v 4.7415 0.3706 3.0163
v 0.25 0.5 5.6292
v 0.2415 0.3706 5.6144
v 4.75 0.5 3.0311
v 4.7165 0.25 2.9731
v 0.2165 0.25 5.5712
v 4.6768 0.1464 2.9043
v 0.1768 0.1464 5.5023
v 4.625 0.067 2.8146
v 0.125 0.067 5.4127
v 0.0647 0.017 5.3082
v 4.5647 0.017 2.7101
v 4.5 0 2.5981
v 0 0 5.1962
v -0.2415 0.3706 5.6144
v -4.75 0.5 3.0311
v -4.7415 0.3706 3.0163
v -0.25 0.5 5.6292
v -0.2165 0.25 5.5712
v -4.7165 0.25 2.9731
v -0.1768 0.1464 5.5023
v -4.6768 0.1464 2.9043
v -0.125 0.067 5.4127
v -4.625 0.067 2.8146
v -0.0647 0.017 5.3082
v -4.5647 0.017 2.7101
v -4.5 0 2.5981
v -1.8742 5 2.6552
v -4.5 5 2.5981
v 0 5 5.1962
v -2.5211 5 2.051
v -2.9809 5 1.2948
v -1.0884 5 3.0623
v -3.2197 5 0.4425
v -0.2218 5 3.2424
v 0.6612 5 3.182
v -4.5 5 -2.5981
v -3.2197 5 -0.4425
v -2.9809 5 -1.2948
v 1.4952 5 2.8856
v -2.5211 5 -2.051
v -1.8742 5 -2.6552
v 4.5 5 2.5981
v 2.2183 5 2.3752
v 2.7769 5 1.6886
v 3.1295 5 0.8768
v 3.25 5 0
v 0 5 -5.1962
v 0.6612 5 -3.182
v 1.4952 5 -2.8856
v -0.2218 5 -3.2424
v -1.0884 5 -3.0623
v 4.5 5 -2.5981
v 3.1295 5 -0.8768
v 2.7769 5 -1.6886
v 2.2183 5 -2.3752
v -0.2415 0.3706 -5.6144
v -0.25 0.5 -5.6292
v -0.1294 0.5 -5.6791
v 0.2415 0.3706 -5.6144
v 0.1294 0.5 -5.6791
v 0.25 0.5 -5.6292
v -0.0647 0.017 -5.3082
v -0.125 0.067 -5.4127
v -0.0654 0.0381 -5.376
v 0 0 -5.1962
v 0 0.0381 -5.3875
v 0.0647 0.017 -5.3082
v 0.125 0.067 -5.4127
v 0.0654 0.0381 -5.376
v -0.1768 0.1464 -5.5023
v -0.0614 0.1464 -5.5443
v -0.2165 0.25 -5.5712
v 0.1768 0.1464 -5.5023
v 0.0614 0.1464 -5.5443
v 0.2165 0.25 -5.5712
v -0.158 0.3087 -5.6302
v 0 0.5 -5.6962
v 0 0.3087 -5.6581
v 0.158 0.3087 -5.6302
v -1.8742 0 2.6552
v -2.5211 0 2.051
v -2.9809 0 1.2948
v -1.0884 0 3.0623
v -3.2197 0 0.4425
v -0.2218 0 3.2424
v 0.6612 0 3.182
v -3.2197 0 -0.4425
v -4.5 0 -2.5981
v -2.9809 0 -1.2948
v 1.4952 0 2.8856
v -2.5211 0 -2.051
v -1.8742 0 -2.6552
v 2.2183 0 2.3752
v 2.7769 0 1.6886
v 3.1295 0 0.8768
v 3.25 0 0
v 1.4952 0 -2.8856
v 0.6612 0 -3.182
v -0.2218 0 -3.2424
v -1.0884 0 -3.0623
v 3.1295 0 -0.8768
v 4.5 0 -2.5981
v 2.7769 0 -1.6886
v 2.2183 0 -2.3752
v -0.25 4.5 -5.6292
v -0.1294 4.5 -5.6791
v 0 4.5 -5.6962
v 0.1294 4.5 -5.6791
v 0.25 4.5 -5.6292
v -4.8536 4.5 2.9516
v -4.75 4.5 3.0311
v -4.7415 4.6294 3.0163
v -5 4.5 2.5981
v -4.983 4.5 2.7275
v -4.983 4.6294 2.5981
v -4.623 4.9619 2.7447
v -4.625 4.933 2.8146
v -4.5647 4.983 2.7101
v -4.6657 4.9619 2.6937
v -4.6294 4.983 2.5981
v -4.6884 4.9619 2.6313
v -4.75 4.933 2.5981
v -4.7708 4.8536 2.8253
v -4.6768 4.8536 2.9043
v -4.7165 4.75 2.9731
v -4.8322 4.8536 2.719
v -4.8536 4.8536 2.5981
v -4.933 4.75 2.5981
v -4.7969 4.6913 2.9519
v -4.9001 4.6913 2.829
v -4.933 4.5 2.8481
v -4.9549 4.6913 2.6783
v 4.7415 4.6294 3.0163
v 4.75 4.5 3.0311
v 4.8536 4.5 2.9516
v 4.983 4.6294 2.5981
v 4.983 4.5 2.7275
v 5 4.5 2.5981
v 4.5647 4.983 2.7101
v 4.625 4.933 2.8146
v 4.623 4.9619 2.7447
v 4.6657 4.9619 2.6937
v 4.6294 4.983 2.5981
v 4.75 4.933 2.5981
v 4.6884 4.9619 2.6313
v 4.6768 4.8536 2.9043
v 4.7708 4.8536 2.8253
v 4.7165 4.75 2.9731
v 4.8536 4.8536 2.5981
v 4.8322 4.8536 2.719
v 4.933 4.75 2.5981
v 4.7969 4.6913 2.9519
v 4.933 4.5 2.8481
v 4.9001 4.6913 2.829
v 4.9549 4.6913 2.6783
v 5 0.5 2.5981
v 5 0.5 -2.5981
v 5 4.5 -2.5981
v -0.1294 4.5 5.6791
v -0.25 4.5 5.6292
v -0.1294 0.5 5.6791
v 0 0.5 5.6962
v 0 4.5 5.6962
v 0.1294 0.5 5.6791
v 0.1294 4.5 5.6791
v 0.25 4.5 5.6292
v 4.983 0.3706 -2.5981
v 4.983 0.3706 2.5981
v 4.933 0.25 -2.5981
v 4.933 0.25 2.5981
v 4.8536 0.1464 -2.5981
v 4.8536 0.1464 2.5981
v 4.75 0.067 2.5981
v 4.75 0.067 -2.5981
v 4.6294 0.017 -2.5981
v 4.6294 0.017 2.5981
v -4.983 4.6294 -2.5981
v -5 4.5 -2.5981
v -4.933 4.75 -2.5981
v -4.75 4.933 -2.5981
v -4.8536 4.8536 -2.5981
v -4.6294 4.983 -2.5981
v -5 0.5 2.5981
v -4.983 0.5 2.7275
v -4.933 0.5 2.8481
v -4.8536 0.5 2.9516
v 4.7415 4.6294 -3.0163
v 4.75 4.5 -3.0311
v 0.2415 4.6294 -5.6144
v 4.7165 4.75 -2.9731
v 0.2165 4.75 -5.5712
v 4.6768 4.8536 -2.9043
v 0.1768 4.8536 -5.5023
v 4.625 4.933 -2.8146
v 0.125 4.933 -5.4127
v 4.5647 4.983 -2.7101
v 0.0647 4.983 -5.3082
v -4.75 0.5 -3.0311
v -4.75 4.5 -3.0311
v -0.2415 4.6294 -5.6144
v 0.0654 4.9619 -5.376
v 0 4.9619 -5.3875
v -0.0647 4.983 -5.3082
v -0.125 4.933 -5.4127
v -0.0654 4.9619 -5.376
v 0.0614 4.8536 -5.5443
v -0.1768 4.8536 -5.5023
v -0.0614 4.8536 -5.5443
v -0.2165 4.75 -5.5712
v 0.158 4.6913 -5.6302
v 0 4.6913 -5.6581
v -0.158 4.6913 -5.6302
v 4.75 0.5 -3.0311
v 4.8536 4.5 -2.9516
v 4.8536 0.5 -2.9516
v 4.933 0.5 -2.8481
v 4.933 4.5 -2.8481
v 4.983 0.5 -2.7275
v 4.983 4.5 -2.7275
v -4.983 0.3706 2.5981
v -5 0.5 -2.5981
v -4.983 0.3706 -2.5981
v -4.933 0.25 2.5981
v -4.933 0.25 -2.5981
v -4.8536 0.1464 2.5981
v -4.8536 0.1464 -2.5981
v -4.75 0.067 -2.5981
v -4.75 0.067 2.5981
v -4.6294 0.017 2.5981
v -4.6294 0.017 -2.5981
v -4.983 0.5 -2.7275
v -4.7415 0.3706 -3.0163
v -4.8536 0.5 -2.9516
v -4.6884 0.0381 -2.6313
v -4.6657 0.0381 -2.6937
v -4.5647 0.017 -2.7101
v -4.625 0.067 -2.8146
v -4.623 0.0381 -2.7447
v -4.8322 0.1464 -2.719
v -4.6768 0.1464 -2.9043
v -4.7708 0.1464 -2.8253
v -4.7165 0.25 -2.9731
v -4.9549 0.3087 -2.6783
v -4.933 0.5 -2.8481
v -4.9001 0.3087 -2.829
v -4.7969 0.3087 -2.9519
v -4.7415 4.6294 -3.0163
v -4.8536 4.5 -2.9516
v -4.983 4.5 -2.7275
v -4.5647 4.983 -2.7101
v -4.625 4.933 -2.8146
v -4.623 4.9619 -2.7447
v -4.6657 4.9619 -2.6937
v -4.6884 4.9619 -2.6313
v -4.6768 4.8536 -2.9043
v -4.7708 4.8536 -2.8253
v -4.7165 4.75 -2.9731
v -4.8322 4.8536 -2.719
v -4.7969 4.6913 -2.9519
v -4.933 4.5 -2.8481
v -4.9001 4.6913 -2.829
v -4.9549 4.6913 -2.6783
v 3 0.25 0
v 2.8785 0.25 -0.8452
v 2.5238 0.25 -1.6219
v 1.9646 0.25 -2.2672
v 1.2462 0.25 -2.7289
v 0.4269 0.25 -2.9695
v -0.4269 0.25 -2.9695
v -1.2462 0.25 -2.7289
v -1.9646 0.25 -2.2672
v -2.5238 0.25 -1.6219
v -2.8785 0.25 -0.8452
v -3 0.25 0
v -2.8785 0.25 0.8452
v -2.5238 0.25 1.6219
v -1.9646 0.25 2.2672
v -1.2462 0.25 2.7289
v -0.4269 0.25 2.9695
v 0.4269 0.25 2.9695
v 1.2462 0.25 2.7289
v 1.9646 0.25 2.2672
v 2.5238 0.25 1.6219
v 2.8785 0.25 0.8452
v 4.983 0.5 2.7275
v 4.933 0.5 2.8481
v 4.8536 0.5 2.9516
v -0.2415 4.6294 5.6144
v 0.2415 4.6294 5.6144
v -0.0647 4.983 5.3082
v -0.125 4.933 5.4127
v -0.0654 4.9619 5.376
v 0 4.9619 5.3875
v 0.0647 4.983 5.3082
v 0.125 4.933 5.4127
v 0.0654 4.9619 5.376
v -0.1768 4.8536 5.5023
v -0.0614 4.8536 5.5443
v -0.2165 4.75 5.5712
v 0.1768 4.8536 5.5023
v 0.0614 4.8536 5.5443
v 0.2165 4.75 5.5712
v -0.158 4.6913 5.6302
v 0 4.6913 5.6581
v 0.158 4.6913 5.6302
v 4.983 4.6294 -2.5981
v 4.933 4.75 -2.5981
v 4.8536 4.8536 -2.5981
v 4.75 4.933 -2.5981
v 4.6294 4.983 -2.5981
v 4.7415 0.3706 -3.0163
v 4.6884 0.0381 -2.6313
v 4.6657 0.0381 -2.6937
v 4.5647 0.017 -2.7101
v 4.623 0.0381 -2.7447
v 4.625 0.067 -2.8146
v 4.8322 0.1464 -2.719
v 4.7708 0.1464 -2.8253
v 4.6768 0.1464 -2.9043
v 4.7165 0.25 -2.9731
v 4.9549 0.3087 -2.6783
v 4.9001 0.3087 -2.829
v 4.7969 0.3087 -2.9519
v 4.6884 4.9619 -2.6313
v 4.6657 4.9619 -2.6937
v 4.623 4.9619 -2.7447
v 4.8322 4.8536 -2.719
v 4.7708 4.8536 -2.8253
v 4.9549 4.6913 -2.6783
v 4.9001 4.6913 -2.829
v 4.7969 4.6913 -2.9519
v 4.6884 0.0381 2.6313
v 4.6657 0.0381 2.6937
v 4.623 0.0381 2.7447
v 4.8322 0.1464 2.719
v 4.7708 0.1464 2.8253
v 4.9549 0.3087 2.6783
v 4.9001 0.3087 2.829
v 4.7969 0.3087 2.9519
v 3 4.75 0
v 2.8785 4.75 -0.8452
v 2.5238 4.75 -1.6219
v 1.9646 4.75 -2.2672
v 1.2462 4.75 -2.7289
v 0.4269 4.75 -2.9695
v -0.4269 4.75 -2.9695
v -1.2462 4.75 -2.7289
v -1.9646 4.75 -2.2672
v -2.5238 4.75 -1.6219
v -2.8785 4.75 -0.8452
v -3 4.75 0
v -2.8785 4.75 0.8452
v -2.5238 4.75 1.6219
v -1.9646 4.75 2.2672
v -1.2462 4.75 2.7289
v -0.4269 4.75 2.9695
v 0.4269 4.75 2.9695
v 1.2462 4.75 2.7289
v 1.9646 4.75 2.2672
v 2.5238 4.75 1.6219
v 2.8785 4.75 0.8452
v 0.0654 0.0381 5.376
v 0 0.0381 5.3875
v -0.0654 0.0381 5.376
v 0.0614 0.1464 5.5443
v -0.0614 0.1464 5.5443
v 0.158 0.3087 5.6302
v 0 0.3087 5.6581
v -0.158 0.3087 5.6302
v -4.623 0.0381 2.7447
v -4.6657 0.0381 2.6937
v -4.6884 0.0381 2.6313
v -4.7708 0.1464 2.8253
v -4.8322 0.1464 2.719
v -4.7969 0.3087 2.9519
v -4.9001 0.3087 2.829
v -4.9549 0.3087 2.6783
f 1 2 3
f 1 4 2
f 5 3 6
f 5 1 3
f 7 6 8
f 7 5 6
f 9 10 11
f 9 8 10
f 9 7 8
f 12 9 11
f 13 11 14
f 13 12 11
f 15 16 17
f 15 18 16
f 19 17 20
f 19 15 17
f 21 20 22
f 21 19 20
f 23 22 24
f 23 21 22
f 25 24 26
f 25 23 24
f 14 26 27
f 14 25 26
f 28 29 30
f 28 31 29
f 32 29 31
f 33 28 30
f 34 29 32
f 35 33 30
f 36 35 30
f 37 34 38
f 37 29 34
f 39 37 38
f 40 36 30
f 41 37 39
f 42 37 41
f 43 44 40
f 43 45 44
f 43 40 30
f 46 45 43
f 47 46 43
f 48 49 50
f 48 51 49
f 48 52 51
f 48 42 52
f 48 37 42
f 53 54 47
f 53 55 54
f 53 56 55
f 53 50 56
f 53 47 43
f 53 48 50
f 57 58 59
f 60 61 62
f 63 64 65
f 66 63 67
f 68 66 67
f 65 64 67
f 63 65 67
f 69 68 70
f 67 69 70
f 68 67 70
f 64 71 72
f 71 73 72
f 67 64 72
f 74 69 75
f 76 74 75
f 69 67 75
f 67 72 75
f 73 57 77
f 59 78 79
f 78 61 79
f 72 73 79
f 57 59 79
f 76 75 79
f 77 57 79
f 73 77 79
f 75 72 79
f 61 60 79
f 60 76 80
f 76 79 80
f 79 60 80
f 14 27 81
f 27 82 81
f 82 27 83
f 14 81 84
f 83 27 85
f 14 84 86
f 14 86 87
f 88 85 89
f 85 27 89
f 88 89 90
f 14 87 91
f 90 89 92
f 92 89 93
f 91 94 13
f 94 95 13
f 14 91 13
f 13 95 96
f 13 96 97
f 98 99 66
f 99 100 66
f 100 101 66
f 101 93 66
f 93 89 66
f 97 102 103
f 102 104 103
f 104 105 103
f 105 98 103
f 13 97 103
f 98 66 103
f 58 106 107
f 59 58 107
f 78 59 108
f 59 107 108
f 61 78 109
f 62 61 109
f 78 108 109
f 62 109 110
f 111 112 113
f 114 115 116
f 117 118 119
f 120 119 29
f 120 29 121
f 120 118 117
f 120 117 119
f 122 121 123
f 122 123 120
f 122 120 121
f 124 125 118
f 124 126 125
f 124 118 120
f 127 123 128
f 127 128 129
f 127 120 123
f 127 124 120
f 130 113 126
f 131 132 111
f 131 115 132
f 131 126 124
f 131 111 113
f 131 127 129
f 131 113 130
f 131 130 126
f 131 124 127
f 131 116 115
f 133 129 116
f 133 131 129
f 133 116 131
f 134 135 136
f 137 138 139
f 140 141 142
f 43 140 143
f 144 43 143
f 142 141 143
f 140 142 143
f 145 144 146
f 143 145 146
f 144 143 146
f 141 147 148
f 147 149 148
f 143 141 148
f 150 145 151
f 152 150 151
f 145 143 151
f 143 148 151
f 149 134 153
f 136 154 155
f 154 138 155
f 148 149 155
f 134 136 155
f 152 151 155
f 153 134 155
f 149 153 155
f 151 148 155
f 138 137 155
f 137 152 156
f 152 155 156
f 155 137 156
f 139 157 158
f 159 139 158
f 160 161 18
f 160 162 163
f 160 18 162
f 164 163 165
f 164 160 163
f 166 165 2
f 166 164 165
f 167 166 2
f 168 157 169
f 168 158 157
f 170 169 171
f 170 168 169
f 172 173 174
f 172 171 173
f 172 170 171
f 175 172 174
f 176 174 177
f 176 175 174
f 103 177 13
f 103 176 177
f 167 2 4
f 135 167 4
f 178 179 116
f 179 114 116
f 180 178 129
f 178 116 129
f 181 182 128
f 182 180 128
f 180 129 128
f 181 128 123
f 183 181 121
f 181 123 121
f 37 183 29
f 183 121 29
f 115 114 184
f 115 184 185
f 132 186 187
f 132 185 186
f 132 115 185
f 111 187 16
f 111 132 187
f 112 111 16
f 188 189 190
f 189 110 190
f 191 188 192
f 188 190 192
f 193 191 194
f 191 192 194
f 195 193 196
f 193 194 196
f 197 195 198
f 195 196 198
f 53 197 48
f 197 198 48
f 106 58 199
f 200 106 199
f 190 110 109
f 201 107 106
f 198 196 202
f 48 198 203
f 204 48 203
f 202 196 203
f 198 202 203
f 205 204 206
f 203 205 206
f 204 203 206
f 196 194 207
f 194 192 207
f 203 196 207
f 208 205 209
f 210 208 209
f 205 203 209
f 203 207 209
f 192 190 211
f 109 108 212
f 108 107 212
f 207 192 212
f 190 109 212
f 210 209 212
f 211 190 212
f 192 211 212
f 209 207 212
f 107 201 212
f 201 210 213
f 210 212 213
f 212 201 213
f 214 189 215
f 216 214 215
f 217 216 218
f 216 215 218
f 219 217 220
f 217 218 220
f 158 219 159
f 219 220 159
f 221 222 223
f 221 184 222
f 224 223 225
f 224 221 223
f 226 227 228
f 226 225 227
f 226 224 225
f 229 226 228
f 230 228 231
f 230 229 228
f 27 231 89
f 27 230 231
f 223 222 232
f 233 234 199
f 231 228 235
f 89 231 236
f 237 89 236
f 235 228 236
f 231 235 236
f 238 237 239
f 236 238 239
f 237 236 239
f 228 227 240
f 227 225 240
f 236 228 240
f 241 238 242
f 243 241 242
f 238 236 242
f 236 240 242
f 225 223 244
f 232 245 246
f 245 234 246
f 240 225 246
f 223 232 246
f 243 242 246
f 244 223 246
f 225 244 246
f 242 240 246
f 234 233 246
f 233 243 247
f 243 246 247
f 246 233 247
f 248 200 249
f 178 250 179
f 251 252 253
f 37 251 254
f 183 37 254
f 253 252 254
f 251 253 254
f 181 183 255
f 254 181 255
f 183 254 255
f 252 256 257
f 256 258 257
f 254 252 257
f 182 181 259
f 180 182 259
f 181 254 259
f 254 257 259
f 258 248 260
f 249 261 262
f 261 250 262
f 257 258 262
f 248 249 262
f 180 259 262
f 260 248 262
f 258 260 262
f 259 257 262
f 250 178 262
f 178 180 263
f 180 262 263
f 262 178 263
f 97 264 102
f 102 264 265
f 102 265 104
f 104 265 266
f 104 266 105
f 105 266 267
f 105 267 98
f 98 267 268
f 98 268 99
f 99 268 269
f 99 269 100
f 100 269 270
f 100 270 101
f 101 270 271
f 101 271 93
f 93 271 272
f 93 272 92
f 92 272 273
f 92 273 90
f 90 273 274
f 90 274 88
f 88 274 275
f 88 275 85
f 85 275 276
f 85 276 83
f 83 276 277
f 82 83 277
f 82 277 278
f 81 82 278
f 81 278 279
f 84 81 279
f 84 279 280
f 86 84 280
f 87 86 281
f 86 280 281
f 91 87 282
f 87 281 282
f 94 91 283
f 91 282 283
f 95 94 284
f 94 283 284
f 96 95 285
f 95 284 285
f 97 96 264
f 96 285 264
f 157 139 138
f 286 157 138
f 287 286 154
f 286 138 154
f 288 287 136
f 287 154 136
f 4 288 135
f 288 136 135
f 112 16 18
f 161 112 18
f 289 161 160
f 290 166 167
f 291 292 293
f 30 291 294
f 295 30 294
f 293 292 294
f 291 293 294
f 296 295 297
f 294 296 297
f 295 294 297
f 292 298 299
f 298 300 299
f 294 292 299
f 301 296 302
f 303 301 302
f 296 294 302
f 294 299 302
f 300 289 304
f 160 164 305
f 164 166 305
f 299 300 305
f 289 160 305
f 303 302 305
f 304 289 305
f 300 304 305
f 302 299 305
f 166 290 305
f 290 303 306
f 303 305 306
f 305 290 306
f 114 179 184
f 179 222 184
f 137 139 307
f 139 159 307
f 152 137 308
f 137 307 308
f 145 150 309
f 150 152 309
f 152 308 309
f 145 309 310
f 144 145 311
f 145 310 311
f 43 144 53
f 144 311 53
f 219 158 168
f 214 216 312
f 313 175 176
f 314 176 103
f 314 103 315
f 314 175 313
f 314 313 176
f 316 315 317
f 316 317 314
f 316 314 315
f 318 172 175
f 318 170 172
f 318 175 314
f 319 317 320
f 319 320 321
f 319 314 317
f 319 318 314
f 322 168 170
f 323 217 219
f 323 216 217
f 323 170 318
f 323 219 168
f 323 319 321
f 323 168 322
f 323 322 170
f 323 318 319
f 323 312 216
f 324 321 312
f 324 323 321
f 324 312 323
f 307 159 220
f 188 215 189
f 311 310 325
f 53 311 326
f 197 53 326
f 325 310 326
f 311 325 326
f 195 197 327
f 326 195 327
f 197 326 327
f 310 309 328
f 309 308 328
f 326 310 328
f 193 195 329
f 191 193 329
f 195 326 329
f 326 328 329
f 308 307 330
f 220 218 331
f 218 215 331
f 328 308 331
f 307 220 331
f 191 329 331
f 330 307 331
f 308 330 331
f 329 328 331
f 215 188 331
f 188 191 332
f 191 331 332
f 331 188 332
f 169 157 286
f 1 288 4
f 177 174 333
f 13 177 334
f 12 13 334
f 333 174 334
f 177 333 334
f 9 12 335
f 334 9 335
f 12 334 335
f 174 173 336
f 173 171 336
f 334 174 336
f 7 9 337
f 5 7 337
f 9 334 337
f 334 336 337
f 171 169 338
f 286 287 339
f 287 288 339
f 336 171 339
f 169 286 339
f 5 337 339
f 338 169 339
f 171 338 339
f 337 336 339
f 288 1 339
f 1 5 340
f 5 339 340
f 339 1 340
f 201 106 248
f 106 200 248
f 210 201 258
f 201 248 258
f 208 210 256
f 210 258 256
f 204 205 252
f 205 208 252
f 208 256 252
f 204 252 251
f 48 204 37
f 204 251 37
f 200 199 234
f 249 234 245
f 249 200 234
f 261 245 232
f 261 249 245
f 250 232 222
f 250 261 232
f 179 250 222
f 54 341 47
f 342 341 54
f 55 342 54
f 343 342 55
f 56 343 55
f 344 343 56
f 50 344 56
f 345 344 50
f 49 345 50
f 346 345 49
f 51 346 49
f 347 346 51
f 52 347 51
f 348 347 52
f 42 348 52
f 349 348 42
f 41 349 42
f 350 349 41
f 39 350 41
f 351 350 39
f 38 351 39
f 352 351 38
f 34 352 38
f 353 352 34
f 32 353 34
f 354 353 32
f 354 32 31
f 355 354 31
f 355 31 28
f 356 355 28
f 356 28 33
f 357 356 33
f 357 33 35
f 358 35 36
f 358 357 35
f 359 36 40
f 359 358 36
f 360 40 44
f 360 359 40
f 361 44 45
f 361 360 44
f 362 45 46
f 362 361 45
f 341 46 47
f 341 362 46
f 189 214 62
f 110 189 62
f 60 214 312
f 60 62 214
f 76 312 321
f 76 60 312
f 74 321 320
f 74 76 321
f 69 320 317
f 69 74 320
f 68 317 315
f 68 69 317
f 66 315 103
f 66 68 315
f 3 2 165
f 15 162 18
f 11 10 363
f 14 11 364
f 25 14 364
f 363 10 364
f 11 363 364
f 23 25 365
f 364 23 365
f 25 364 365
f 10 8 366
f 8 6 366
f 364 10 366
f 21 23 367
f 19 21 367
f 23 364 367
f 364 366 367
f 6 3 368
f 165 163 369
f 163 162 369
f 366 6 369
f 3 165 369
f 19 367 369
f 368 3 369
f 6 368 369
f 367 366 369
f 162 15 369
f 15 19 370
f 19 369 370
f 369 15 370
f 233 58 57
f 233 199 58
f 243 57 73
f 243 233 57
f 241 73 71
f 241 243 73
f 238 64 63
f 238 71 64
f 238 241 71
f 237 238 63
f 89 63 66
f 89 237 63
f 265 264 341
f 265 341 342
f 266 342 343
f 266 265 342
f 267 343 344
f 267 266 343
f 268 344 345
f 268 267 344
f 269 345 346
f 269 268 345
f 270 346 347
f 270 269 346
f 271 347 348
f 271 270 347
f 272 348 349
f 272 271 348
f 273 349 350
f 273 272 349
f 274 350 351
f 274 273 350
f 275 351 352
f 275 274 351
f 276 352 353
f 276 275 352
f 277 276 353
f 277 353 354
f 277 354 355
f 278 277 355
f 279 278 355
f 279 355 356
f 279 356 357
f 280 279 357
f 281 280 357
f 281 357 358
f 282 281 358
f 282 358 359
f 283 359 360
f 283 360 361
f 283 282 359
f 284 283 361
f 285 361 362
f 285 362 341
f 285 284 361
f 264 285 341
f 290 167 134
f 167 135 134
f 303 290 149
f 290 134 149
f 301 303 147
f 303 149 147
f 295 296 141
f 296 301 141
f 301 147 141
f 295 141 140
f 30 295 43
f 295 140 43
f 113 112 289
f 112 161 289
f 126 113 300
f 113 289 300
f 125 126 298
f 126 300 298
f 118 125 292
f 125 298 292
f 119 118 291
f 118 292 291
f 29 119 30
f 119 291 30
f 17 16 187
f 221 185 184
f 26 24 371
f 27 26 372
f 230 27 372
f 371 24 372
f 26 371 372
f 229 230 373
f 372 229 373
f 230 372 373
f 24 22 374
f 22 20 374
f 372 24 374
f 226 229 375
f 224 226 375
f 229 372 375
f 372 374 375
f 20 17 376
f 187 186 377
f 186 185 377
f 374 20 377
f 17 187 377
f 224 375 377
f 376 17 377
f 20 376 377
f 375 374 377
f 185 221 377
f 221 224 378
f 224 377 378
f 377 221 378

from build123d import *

# Parameters (mm, degrees)
ESQUISSE1_R        = 3
BOSS_EXTRU_1_DEPTH = 5
CONG_2_R           = 0.5
CHANFREIN1_SIZE    = 0.25


with BuildPart() as part:
    # Esquisse1 → Boss.-Extru.1 (new body)
    with BuildSketch(Plane(origin=(0, 0, 0), x_dir=(1, 0, 0), z_dir=(0, 1, 0))):
        Polygon((0, 5.773502692), (-5, 2.886751346), (-5, -2.886751346), (0, -5.773502692), (5, -2.886751346), (5, 2.886751346), align=None)
        Circle(ESQUISSE1_R, mode=Mode.SUBTRACT)
    extrude(amount=BOSS_EXTRU_1_DEPTH)

    # Congé2
    cong_2_edges = [part.edges().sort_by_distance(p)[0] for p in [
        (-5, 5, 0),
        (5, 2.5, -2.886751346),
        (5, 2.5, 2.886751346),
        (0, 2.5, 5.773502692),
        (-5, 2.5, 2.886751346),
        (-5, 2.5, -2.886751346),
        (0, 2.5, -5.773502692),
        (-2.5, 5, 4.330127019),
        (2.5, 5, 4.330127019),
        (5, 5, 0),
        (2.5, 5, -4.330127019),
        (5, 0, 0),
        (2.5, 0, 4.330127019),
        (-2.5, 0, 4.330127019),
        (-2.5, 5, -4.330127019),
        (-5, 0, 0),
        (-2.5, 0, -4.330127019),
        (2.5, 0, -4.330127019),
    ]]
    fillet(cong_2_edges, radius=CONG_2_R)

    # Chanfrein1
    chanfrein1_edges = [part.edges().sort_by_distance(p)[0] for p in [
        (-3, 0, 0),
        (-3, 5, 0),
    ]]
    chamfer(chanfrein1_edges, length=CHANFREIN1_SIZE)


solid = part.part
